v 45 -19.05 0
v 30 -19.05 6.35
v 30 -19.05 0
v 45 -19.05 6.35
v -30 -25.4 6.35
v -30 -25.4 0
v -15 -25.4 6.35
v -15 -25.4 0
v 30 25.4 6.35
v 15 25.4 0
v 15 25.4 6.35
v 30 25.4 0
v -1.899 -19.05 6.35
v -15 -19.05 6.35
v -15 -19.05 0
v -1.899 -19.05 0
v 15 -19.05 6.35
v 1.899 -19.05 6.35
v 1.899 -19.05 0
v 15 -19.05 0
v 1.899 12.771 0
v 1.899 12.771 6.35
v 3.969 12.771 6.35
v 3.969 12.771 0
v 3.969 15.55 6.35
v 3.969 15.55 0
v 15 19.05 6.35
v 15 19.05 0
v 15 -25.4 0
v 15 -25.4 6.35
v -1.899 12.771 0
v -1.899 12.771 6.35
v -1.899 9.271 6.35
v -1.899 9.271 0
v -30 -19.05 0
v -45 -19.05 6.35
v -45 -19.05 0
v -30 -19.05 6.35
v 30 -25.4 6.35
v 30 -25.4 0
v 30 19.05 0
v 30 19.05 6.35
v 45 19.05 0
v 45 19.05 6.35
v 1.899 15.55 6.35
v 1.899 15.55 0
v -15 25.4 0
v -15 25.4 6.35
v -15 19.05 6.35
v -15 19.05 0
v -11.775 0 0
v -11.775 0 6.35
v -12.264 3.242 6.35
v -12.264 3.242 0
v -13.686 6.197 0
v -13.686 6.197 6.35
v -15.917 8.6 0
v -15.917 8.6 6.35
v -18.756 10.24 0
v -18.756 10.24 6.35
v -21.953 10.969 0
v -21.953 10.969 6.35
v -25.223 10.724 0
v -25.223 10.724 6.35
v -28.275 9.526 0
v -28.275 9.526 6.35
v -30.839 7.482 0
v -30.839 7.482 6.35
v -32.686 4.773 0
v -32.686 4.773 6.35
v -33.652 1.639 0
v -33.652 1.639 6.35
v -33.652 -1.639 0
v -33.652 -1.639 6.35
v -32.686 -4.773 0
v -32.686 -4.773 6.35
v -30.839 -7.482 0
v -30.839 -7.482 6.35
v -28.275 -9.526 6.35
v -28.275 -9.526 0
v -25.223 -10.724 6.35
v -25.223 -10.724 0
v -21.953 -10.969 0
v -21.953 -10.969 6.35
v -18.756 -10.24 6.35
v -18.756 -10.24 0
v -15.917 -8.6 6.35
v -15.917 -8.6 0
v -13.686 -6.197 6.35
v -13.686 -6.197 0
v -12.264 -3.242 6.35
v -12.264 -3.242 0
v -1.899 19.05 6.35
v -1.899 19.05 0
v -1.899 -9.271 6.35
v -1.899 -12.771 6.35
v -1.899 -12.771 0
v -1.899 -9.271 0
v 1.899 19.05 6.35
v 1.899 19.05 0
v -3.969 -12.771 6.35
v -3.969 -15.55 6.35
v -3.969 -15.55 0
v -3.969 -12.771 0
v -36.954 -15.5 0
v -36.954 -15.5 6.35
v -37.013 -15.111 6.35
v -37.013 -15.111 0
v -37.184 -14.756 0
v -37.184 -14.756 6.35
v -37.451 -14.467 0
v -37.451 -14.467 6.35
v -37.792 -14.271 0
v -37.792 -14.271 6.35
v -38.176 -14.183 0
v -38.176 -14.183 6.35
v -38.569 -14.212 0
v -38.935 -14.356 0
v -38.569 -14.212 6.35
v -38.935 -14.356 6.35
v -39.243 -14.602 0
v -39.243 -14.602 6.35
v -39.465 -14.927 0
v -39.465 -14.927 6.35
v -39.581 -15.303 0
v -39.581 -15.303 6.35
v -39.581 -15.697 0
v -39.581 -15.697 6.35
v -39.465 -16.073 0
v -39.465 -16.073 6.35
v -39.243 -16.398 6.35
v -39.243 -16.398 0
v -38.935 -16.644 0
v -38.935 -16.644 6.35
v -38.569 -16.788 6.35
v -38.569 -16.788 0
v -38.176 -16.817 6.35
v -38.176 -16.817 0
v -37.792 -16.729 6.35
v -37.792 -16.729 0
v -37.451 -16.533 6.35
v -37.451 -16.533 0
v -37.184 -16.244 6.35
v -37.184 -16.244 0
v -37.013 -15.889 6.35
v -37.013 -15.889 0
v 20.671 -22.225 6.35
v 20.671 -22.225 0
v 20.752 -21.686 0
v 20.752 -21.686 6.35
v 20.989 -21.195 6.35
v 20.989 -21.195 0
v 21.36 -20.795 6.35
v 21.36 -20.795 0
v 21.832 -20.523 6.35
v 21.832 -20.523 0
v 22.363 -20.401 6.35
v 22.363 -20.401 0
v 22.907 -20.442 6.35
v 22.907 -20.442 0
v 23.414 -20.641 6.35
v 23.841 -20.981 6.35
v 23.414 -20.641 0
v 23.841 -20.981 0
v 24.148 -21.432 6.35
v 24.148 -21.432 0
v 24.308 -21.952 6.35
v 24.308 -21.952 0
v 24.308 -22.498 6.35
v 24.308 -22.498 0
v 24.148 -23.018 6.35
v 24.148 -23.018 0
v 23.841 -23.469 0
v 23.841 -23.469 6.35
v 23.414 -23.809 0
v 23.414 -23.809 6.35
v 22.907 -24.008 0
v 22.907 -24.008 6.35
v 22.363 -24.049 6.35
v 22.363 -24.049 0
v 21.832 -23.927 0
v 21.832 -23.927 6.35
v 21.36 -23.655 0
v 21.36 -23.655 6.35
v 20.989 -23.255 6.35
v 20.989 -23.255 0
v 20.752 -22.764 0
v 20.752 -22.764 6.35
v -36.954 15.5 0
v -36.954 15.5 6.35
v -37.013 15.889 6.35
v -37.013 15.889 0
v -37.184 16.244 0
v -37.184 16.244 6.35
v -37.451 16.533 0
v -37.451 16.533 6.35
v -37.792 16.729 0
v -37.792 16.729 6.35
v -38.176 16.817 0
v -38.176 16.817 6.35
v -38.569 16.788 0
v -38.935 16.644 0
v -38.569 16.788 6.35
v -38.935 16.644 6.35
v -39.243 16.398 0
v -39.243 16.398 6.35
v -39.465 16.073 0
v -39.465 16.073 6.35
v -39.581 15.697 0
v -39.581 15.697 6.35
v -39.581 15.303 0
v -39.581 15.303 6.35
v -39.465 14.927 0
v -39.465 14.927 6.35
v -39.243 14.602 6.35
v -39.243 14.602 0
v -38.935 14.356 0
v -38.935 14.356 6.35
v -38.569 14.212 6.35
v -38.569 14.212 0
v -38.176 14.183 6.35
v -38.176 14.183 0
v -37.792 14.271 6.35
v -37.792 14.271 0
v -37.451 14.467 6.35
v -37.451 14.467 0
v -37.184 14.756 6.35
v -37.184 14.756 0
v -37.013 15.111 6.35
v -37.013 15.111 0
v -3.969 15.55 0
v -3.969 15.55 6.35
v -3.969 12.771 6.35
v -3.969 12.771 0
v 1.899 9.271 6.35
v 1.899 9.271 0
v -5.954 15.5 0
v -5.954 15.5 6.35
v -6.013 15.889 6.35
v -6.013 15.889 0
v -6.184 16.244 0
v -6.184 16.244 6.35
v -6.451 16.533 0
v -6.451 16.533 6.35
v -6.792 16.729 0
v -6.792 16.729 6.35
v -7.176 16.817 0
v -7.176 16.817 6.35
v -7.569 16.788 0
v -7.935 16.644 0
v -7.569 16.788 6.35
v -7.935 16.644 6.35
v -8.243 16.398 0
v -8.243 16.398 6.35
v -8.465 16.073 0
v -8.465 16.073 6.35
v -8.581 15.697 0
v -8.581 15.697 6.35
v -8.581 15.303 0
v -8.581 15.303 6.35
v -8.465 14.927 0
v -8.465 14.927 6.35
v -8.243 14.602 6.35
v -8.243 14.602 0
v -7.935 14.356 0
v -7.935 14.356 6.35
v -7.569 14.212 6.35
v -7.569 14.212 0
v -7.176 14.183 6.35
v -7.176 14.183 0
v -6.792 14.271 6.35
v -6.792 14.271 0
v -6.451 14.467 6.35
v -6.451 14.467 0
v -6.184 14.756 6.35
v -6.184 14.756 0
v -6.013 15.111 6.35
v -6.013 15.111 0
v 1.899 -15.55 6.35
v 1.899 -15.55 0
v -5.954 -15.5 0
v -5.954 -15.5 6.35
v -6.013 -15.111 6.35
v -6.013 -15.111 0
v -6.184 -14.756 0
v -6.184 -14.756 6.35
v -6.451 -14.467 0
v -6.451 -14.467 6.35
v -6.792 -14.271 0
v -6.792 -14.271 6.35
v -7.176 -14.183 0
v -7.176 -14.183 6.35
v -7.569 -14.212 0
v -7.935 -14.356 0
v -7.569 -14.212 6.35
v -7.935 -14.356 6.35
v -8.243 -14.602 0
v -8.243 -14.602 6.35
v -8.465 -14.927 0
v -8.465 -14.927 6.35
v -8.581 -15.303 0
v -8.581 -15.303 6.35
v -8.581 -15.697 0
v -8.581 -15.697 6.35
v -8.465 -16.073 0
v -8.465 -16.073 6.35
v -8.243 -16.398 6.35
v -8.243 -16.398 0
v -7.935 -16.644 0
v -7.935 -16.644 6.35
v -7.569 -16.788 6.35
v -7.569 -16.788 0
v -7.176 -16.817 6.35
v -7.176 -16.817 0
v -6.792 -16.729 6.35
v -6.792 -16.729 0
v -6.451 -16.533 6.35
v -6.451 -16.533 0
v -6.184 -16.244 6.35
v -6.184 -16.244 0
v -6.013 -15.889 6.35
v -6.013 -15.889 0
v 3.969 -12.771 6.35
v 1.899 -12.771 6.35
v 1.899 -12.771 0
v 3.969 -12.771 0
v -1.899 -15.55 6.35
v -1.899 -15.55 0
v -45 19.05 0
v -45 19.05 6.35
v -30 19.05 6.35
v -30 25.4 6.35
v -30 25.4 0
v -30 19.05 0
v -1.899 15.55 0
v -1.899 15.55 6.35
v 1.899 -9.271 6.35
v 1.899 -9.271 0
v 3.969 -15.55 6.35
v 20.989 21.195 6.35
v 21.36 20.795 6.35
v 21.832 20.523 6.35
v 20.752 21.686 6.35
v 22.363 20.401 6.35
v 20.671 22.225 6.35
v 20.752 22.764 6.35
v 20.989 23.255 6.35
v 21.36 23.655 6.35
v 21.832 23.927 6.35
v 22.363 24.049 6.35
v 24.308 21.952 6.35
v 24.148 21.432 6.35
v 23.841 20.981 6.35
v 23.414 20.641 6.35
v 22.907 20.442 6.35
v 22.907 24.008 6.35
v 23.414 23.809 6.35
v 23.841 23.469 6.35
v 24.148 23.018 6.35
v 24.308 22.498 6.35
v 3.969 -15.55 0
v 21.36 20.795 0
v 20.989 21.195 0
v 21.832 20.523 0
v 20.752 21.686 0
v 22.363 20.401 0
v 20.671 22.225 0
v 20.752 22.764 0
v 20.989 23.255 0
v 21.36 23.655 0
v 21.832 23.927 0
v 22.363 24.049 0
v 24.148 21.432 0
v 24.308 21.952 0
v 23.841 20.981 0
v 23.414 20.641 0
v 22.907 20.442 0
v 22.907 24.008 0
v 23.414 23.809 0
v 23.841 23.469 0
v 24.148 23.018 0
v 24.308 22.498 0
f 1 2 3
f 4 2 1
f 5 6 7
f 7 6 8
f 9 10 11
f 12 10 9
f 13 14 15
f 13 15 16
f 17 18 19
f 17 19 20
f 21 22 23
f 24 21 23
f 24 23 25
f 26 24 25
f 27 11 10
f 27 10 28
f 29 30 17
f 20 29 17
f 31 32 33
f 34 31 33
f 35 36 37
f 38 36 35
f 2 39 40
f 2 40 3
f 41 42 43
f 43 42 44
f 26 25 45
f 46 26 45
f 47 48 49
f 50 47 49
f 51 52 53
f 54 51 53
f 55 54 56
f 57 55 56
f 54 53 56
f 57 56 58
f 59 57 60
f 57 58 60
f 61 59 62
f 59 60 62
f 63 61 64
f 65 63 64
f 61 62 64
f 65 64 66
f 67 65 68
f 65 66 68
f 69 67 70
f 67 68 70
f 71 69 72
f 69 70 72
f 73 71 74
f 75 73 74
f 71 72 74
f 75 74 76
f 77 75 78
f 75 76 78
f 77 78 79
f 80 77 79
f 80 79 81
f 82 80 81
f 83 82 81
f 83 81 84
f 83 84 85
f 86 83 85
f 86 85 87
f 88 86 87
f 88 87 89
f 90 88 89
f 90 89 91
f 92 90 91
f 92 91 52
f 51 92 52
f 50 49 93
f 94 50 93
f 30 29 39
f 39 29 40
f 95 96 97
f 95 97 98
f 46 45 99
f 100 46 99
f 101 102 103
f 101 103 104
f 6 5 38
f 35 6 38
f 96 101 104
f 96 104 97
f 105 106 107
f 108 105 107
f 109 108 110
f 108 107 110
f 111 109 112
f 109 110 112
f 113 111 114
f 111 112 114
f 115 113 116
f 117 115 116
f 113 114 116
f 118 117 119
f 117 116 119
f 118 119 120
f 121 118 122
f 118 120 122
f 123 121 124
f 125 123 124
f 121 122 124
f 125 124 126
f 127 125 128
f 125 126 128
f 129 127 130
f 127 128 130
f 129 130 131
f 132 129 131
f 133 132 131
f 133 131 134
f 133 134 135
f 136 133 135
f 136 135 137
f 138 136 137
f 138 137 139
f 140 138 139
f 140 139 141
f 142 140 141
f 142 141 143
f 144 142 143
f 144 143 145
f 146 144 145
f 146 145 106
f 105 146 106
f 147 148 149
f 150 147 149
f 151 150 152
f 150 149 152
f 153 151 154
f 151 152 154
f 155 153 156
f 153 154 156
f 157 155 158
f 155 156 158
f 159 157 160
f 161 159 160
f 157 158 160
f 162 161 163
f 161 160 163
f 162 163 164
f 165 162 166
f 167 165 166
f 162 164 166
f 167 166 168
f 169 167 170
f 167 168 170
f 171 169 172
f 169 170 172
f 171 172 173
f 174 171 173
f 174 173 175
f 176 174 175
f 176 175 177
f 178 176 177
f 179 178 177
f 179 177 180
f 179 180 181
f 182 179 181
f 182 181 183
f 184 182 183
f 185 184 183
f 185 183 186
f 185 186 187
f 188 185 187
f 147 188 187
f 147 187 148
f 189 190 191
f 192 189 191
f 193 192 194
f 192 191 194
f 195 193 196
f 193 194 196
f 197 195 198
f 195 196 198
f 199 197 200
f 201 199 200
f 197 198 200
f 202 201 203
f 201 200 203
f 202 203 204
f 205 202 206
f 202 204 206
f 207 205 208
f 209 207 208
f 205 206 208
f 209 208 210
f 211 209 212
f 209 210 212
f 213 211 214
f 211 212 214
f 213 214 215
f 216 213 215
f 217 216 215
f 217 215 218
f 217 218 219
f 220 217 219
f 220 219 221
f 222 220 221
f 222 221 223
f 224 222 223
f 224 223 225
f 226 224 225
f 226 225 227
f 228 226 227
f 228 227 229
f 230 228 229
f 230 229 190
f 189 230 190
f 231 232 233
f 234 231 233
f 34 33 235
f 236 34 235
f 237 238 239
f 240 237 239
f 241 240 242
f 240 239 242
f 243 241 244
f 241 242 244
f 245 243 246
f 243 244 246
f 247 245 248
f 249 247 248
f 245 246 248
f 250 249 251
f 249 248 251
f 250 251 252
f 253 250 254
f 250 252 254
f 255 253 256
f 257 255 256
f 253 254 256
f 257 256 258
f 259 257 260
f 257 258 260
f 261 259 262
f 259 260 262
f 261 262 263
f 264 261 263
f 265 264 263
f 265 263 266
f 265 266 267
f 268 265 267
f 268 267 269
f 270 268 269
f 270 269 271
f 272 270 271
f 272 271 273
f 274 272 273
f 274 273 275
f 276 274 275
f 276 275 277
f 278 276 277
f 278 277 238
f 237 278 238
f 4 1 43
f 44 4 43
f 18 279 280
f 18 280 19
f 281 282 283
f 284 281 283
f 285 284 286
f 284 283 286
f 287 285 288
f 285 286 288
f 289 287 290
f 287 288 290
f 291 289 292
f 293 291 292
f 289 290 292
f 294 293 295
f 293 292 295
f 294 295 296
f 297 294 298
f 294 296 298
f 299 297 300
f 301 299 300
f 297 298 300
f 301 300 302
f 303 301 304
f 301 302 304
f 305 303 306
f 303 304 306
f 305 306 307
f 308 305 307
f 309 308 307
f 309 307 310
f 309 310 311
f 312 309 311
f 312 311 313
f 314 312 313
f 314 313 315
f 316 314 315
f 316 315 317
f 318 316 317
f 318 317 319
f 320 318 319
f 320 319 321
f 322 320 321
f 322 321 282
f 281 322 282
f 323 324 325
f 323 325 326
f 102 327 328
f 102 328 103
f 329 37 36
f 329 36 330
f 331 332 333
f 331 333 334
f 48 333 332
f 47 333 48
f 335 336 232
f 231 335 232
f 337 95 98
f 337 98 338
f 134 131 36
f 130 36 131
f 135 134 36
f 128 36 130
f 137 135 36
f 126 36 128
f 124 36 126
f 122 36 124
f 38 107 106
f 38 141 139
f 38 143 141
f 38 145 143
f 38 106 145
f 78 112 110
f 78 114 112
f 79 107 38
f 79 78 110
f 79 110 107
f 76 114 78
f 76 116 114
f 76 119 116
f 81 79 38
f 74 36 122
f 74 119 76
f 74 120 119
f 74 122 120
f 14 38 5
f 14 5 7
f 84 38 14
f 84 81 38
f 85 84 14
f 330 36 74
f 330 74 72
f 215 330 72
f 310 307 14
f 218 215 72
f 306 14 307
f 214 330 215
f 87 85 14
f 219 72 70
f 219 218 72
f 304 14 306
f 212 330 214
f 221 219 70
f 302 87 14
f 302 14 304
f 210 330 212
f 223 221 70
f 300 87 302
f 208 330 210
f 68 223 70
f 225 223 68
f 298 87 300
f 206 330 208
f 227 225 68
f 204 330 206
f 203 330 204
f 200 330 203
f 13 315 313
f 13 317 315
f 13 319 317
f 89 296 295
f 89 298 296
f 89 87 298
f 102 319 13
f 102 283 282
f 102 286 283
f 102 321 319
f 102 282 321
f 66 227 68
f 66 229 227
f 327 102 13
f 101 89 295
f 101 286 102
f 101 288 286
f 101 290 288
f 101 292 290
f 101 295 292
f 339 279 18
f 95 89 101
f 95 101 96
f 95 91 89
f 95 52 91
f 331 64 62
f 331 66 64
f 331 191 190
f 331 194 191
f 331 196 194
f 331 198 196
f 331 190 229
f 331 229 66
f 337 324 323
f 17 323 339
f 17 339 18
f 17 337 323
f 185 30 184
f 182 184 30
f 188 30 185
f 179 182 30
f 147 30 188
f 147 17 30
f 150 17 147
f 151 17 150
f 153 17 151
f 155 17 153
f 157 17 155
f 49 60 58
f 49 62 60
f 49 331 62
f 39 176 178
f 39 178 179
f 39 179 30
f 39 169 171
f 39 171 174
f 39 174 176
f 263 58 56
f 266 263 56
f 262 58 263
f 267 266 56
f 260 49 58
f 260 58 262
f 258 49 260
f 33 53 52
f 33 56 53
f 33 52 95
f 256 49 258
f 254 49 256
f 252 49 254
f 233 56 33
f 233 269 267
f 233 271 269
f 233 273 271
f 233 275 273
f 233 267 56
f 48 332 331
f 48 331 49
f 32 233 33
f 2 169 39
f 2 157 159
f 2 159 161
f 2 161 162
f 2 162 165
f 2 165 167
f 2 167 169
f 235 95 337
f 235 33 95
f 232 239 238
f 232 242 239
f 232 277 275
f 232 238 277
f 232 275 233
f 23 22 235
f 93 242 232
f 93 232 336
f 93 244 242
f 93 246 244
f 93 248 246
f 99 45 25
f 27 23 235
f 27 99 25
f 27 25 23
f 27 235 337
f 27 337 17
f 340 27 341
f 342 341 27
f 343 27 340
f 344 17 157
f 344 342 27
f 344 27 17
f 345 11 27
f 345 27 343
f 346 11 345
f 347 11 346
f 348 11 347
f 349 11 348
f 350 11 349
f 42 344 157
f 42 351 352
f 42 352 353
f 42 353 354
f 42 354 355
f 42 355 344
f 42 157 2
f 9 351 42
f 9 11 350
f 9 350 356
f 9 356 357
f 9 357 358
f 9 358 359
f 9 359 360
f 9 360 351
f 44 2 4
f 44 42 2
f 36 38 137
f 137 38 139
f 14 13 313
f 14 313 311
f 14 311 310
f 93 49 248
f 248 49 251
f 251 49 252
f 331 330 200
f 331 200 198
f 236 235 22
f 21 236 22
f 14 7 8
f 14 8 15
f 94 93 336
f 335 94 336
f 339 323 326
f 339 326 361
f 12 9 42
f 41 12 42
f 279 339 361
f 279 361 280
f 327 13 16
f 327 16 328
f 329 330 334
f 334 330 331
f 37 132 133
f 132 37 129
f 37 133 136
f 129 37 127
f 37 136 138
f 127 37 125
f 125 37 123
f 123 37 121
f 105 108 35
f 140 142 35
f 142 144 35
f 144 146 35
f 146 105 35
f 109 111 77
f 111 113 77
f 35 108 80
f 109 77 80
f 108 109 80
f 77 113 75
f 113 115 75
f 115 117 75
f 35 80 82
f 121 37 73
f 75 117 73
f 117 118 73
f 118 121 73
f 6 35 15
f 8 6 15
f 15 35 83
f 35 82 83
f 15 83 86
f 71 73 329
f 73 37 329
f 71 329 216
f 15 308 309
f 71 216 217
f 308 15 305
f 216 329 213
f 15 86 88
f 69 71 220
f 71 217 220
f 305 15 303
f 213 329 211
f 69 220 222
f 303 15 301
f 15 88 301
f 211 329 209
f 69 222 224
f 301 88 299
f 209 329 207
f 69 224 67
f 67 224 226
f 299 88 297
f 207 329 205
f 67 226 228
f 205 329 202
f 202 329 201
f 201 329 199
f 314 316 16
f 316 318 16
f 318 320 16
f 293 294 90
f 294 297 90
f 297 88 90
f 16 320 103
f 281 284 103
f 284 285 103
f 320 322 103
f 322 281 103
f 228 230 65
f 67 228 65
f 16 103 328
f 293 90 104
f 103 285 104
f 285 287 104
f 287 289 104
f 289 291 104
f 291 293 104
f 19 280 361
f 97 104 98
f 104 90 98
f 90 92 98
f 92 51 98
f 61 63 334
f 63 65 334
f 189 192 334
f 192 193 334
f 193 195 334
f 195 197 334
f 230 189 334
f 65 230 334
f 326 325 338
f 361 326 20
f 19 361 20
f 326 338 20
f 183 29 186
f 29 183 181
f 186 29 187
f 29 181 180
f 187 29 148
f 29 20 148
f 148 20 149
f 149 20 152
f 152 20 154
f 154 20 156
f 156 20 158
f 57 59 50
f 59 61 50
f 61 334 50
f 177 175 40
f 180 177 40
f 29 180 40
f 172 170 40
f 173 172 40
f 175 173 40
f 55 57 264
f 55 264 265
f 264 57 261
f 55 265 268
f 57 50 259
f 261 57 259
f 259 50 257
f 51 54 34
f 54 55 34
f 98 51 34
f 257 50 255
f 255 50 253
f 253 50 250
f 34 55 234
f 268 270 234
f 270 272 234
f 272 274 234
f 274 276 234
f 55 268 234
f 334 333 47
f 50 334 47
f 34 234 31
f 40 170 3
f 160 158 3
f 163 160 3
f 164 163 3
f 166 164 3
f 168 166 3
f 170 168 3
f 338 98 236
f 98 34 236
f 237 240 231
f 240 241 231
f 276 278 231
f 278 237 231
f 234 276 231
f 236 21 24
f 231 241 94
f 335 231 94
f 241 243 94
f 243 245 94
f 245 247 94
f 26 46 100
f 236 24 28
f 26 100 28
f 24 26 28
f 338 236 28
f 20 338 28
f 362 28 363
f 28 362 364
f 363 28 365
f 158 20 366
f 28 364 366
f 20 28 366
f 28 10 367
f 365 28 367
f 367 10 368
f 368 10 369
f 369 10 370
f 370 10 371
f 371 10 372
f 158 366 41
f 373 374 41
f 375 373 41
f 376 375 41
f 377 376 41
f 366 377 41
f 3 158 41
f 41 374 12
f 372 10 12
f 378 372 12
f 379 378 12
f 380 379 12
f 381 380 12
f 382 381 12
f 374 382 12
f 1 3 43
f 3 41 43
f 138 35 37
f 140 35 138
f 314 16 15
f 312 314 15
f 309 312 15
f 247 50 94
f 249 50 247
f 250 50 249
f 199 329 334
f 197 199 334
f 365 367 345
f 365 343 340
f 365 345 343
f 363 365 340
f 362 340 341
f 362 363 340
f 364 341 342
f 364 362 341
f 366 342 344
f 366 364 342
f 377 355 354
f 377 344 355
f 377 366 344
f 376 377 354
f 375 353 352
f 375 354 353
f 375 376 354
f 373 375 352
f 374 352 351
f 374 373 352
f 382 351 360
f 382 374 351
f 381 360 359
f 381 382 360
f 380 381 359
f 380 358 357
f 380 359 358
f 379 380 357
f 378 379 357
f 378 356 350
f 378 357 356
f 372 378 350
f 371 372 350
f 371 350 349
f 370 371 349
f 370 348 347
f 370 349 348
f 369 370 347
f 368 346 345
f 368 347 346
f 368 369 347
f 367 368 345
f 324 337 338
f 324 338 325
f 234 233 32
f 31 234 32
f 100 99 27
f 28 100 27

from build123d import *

# Parameters (mm, degrees)
SKETCH1_W             = 90
SKETCH1_H             = 50.8
BOSS_EXTRUDE1_DEPTH   = 6.35
SKETCH2_R             = 7.9375
SKETCH2_W             = 15
SKETCH2_H             = 6.35
SKETCH2_W_2           = 30
CUT_EXTRUDE1_DEPTH    = 6.35
CUT_EXTRUDE3_DEPTH    = 53.062294417
SKETCH3_R             = 11
SKETCH3_R_2           = 1.3208
CUT_EXTRUDE2_DEPTH    = 53.062294417
F_6_CLEARANCE_HOLE1_D = 3.6576


with BuildPart() as part:
    # Sketch1 → Boss-Extrude1 (new body)
    with BuildSketch(Plane.XY):
        Rectangle(SKETCH1_W, SKETCH1_H)
    extrude(amount=BOSS_EXTRUDE1_DEPTH)

    # Sketch2 → Cut-Extrude1 (cut)
    with BuildSketch(Plane.XY.offset(6.35)):
        with Locations((-22.775, 0)):
            Circle(SKETCH2_R)
        with Locations((-37.5, -22.225)):
            Rectangle(SKETCH2_W, SKETCH2_H)
        with Locations((0, -22.225)):
            Rectangle(SKETCH2_W_2, SKETCH2_H)
        with Locations((37.5, -22.225)):
            Rectangle(SKETCH2_W, SKETCH2_H)
    cut_extrude1 = extrude(amount=-CUT_EXTRUDE1_DEPTH, mode=Mode.SUBTRACT)

    # Sketch9 → Cut-Extrude3 (cut, through all)
    with BuildSketch(Plane.XY.offset(6.35)):
        Polygon((-1.89865, -9.271), (1.89865, -9.271), (1.89865, -12.7714375), (3.96875, -12.7714375), (3.96875, -15.5495625), (1.89865, -15.5495625), (1.89865, -19.05), (-1.89865, -19.05), (-1.89865, -15.5495625), (-3.96875, -15.5495625), (-3.96875, -12.7714375), (-1.89865, -12.7714375), align=None)
    cut_extrude3 = extrude(amount=-CUT_EXTRUDE3_DEPTH, mode=Mode.SUBTRACT)

    # Mirror2: Cut-Extrude1, Cut-Extrude3 across plane
    add(cut_extrude1.mirror(Plane.ZX), mode=Mode.SUBTRACT)
    add(cut_extrude3.mirror(Plane.ZX), mode=Mode.SUBTRACT)

    # Sketch3 → Cut-Extrude2 (cut, through all)
    with BuildSketch(Plane.XY.offset(6.35)):
        with Locations((-22.775, 0)):
            Circle(SKETCH3_R)
        with Locations((-38.275, 15.5)):
            Circle(SKETCH3_R_2)
        with Locations((-7.275, 15.5)):
            Circle(SKETCH3_R_2)
        with Locations((-7.275, -15.5)):
            Circle(SKETCH3_R_2)
        with Locations((-38.275, -15.5)):
            Circle(SKETCH3_R_2)
    extrude(amount=-CUT_EXTRUDE2_DEPTH, mode=Mode.SUBTRACT)

    # #6 Clearance Hole1 (through all)
    with Locations(Plane.XY.offset(6.35)):
        with Locations((22.5, -22.225)):
            f_6_clearance_hole1 = Hole(F_6_CLEARANCE_HOLE1_D / 2)

    # Mirror3: #6 Clearance Hole1 across plane
    add(f_6_clearance_hole1.mirror(Plane.ZX), mode=Mode.SUBTRACT)


solid = part.part
